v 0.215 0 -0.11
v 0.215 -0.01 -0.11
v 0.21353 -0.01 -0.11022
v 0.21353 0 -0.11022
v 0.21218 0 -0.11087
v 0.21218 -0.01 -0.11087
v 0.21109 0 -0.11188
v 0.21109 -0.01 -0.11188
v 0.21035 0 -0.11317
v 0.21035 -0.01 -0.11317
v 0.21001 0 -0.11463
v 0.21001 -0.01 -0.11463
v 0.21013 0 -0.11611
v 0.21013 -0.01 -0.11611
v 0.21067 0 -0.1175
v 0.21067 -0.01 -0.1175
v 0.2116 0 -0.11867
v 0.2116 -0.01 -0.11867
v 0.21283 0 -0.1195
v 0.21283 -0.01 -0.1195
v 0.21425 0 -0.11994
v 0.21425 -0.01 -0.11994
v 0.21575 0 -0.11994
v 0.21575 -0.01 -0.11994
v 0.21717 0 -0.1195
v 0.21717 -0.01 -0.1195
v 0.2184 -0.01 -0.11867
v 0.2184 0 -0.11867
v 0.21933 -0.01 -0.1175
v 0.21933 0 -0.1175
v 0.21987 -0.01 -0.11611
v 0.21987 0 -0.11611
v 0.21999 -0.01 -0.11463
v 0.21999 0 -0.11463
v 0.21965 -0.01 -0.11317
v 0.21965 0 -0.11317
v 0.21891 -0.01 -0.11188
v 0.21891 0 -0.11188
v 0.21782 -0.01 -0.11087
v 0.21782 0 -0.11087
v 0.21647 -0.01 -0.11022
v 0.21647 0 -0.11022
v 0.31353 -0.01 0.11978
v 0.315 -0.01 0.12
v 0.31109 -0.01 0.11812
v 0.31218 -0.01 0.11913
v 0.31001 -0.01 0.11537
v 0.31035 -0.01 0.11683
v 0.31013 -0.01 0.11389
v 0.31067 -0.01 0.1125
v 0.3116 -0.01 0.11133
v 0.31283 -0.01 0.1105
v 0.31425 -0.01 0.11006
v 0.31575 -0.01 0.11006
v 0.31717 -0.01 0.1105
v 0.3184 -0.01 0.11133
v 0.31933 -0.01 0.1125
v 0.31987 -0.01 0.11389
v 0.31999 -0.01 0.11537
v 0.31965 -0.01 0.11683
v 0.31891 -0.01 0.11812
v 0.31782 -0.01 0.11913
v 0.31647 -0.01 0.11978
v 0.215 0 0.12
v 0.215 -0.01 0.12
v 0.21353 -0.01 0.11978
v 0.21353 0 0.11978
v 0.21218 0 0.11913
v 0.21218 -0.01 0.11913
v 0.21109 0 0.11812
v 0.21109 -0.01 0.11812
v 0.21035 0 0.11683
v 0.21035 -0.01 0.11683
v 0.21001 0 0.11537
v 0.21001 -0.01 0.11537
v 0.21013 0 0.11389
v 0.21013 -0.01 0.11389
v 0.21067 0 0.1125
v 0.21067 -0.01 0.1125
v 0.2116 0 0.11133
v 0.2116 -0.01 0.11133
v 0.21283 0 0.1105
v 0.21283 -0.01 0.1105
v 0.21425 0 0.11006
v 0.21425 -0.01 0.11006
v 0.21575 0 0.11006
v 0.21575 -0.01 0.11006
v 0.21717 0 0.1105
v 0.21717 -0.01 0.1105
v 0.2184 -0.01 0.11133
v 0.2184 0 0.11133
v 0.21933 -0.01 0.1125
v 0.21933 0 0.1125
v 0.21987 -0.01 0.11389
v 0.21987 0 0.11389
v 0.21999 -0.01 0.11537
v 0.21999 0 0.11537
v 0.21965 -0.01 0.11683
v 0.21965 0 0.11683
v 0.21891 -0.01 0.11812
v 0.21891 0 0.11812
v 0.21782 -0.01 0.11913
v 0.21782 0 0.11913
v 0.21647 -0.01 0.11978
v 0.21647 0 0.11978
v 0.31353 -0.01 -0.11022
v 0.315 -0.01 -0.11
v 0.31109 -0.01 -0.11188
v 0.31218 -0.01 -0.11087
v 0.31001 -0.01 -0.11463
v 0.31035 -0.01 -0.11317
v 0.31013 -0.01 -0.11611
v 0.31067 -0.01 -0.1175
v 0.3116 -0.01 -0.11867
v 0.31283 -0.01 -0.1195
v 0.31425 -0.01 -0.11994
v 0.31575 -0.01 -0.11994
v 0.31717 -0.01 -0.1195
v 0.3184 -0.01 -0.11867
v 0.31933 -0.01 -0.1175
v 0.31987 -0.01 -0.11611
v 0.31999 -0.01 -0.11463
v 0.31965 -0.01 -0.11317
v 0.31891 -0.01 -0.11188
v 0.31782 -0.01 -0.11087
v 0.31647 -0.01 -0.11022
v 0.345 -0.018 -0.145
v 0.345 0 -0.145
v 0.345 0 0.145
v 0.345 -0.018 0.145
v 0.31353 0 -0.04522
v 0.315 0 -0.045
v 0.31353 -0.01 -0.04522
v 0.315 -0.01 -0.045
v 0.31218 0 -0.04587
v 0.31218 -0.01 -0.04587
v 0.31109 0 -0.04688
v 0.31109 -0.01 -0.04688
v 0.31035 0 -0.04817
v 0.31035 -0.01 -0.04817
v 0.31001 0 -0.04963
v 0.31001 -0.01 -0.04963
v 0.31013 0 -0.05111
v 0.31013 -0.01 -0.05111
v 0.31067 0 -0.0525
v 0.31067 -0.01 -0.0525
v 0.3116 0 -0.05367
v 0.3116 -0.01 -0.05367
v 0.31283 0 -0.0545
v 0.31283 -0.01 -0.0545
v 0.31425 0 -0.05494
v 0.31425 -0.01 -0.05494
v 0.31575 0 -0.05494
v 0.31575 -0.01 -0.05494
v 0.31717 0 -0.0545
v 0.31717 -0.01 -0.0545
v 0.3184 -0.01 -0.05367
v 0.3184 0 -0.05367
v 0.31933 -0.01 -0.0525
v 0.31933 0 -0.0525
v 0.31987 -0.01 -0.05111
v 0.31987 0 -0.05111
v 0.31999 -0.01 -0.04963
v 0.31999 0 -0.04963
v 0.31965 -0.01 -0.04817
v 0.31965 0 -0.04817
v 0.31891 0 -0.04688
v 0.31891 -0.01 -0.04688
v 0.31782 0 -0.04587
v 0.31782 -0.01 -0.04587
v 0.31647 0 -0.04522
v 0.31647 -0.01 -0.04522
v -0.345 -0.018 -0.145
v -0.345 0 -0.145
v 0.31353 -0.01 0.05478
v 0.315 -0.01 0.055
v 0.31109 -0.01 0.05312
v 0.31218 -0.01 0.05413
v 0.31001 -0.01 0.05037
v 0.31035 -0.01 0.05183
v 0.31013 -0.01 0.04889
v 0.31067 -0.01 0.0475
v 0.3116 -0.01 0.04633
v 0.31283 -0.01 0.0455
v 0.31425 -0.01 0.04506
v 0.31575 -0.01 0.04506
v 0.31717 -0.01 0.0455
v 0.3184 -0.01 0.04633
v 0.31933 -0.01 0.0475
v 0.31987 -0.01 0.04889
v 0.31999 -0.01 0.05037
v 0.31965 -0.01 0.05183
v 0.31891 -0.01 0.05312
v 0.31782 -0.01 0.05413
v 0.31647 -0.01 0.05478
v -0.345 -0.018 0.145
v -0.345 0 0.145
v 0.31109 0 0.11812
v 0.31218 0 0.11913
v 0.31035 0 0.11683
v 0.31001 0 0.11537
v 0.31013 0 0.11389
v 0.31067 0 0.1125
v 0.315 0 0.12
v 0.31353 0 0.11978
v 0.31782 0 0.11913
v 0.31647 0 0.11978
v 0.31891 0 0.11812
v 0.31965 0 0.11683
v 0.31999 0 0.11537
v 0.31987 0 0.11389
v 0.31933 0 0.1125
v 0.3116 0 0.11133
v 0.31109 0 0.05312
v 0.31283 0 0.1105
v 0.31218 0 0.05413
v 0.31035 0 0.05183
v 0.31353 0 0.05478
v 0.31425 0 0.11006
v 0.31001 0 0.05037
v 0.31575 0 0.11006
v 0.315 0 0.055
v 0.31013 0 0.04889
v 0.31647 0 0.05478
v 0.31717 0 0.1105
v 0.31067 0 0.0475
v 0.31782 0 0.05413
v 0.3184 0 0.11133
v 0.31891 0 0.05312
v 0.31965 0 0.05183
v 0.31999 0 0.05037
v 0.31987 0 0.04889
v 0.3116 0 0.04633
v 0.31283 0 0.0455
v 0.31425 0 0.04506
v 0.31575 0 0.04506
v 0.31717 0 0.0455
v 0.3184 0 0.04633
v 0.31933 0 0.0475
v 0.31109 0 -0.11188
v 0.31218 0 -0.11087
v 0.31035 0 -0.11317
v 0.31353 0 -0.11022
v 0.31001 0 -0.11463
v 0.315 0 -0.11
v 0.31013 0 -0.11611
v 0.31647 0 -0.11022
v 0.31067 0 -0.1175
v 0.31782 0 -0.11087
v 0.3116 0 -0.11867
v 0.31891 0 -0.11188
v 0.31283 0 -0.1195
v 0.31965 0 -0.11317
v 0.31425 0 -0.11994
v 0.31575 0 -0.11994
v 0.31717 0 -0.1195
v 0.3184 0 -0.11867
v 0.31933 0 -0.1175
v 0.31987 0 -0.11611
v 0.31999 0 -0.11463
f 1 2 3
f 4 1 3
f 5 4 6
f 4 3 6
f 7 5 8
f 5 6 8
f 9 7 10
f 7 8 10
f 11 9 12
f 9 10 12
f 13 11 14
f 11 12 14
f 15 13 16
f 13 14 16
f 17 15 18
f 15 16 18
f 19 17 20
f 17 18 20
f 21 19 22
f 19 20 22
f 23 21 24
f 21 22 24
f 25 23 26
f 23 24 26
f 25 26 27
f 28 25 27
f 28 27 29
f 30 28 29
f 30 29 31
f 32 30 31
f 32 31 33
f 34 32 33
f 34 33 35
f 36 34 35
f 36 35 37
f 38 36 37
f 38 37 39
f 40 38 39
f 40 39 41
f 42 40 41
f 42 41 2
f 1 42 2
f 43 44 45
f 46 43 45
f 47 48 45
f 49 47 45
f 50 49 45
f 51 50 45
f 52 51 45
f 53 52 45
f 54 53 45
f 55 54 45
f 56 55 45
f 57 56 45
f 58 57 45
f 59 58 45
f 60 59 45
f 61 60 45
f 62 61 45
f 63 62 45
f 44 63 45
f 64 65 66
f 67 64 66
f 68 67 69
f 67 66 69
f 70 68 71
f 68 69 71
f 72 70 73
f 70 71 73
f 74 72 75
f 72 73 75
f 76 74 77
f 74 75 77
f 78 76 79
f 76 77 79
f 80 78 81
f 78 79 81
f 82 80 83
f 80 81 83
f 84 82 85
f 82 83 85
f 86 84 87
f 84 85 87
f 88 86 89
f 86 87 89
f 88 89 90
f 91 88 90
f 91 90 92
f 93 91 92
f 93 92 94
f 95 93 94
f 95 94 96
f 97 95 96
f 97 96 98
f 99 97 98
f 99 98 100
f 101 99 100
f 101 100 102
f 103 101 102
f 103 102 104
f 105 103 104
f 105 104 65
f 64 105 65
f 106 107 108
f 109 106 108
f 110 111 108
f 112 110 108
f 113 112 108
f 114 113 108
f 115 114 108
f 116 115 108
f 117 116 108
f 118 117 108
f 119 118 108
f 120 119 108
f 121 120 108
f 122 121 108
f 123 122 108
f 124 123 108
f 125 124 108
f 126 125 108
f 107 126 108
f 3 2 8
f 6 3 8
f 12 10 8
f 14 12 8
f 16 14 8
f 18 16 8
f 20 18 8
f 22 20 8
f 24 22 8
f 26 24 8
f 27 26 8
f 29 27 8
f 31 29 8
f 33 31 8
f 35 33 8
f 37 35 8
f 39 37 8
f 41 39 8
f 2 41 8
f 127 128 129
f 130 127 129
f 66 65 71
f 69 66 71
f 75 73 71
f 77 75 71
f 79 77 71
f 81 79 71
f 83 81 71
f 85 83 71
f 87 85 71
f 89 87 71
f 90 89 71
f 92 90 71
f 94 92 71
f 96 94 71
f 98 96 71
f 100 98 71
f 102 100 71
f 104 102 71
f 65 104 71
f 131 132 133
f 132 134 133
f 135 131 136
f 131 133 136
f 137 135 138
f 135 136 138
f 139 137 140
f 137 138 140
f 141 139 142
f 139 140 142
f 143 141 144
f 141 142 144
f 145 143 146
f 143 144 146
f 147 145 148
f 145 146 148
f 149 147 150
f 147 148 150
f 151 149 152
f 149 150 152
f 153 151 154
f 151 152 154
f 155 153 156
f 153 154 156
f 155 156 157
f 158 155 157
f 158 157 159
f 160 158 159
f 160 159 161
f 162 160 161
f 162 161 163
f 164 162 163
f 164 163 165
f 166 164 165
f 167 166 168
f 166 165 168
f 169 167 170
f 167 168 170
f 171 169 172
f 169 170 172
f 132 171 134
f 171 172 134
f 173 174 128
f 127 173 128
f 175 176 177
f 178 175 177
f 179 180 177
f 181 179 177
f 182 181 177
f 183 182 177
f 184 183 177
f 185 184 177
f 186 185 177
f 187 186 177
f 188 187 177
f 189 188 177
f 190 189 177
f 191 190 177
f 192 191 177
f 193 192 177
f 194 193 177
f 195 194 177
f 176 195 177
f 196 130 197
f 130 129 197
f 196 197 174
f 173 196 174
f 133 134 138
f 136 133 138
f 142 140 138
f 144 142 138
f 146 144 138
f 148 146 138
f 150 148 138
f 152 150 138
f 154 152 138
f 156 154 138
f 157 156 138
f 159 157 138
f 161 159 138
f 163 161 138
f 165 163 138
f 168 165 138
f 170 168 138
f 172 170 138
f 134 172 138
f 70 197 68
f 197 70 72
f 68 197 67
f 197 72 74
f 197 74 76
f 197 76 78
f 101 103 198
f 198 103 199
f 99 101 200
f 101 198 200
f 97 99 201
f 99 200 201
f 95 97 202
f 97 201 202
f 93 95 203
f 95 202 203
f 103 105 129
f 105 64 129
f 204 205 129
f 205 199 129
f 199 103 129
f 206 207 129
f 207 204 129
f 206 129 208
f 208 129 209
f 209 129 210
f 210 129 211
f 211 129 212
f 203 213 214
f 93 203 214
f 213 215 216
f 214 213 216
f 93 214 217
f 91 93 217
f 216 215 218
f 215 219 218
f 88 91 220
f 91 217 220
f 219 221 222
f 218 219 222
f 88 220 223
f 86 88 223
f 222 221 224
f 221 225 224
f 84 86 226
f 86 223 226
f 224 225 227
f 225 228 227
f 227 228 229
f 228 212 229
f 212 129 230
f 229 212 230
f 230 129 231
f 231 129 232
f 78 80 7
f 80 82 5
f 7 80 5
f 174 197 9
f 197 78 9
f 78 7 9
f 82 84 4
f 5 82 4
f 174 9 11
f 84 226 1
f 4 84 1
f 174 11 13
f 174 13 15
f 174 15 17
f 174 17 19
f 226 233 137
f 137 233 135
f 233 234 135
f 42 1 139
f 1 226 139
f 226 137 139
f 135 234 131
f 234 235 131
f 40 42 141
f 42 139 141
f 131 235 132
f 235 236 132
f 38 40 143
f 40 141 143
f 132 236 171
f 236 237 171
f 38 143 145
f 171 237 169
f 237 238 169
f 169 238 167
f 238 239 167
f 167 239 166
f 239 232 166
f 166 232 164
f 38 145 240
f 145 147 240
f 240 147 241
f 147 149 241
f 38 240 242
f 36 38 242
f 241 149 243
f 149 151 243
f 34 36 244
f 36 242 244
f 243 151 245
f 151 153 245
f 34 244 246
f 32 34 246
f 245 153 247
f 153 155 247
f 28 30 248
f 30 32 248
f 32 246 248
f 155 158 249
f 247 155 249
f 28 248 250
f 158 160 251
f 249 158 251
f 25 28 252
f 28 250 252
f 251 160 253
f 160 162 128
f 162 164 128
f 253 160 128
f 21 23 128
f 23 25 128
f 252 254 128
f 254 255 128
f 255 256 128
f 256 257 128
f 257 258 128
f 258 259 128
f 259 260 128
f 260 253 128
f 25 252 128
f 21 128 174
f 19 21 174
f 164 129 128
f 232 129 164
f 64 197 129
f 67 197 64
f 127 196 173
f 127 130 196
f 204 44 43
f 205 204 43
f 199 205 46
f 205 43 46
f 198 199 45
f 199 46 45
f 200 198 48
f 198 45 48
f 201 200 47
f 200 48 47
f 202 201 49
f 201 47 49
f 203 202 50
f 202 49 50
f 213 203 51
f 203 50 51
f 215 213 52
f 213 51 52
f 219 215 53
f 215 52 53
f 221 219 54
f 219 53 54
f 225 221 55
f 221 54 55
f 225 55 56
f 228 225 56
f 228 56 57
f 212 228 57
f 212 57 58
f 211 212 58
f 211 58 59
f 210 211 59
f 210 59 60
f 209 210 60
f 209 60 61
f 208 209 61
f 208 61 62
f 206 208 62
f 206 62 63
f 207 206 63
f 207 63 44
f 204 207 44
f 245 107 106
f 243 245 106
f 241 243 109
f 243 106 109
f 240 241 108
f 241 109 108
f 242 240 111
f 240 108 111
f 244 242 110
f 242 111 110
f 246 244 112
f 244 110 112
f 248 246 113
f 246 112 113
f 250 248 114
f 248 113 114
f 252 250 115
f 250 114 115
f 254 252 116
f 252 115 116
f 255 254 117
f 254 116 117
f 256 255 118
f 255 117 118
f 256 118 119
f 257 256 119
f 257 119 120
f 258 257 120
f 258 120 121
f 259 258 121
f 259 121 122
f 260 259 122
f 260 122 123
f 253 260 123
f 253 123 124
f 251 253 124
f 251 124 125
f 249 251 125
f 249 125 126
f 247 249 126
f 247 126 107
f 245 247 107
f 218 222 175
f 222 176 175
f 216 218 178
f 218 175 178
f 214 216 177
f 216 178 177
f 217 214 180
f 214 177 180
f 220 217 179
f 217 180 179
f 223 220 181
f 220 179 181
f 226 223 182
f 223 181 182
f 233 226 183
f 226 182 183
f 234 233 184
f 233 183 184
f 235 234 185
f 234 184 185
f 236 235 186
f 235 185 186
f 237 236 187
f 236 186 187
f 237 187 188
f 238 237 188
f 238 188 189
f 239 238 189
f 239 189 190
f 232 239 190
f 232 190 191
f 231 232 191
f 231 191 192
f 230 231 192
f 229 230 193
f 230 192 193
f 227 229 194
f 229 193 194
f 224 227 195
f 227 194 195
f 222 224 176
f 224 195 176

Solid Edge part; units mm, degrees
sketch "Sketch1" plane through (0, 0, 0) normal (0, -1, 0) x (1, 0, 0)
  line L0 (-0.345, -0.145) -> (0.345, -0.145)
  line L1 (0.345, -0.145) -> (0.345, 0.145)
  line L2 (0.345, 0.145) -> (-0.345, 0.145)
  line L3 (-0.345, 0.145) -> (-0.345, -0.145)
  dimension "D1" = 0.29
  dimension "D2" = 0.69
extrude "Protrusion1" add sketch "Sketch1" along normal blind 0.018
hole "Bohrung_13" at (0.315, 0, 0.05) direction (0, -1, 0) diameter 0.01 depth 0.01
hole "Hole1" at (0.315, 0, -0.05) direction (0, -1, 0) diameter 0.01 depth 0.01
hole "Hole2" at (0.315, 0, -0.115) direction (0, -1, 0) diameter 0.01 depth 0.01
hole "Hole3" at (0.215, 0, -0.115) direction (0, -1, 0) diameter 0.01 depth 0.01
hole "Hole4" at (0.315, 0, 0.115) direction (0, -1, 0) diameter 0.01 depth 0.01
hole "Hole5" at (0.215, 0, 0.115) direction (0, -1, 0) diameter 0.01 depth 0.01
